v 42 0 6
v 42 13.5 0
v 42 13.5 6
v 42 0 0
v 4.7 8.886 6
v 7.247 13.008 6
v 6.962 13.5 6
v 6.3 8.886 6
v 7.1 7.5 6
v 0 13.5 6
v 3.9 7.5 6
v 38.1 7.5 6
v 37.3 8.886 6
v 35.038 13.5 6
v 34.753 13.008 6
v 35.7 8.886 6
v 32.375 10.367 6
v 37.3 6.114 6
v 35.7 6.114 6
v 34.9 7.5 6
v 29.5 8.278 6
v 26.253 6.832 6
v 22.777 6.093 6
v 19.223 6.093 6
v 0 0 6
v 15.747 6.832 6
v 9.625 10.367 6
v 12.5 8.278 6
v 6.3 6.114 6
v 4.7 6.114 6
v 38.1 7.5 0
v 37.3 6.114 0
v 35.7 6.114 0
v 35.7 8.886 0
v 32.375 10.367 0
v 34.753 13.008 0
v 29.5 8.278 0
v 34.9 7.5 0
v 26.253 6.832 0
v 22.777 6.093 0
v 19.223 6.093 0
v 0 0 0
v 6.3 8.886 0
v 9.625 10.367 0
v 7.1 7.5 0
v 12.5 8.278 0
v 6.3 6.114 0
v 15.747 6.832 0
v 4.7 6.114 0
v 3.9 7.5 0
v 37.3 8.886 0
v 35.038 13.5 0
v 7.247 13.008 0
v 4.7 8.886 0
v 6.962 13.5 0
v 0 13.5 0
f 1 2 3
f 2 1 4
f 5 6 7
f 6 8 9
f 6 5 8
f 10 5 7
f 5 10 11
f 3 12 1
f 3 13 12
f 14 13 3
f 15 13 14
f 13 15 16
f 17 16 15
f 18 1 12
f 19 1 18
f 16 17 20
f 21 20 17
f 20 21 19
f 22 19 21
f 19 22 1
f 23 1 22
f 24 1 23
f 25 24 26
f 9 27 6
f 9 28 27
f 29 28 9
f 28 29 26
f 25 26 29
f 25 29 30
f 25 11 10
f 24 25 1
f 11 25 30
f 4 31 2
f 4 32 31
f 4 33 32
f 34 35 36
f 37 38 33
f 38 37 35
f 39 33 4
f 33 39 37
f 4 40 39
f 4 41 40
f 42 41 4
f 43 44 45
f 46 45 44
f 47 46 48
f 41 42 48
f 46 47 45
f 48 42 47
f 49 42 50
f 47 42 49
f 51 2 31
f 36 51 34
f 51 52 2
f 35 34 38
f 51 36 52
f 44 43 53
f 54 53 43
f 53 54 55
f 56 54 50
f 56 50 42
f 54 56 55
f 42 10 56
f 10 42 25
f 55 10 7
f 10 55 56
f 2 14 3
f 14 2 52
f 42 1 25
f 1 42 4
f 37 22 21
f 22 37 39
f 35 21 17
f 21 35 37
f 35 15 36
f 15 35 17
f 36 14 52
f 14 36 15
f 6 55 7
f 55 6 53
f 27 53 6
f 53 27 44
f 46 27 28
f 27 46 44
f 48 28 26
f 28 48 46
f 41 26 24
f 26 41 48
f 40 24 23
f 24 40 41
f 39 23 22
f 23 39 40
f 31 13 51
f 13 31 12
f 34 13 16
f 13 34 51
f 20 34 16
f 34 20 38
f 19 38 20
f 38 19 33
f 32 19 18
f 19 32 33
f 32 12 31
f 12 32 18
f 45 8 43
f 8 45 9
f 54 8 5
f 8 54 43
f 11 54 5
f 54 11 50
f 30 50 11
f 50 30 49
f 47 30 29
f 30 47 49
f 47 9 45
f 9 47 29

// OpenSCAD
//Motors lib
m3=1.5;
m4=2;

echo ("Loading Motors Lib....");
//Deatils of the Motors [Nema 14, Nema 17, Nema 23]
//half of the distance of the bolts from each other
nema_bolt_offset = [13,15.5,23.57];
//The bolt used to secure the motor
nema_bolt_size = [m3+01,m3+0.1,m4+0.1];
//Circural eleavation around the shaft on the top of the motor
nema_middle = [12,17,19.5];
//width of the motor 
nema_width = [35.5,42,56.4];
//lenght of the motor. This value may need to get adjusted as it depends of many factors like brand and strenght
nema_lenght = [28,45,56];
//shaft of the motor 
nema_shaft = [5,5,6.35];

//Ofseting the motor holes away of the edge of the motors to give a small gap.
motor_edge_gap=-2;
motor_holder_thickness = 6; //TODO move this to Printer.scad


module nema_mount(axe){
	difference(){
		cube([nema_width[axe],nema_bolt_offset[axe]+motor_edge_gap,motor_holder_thickness],center=false);
		translate([nema_width[axe]/2,nema_width[axe]/2-motor_edge_gap,motor_holder_thickness/2]){
			linear_extrude(height = motor_holder_thickness+2, center = true, convexity = 10)	{
				nema_mount_holes(axe);	
			}
		}
	}
}

//Axes can be [X,Y,Z,E] 
module nema_mount_holes(axe){
	union(){ 
		translate([nema_bolt_offset[axe],nema_bolt_offset[axe],0]){
					circle(nema_bolt_size[axe]);
				}
		translate([-nema_bolt_offset[axe],nema_bolt_offset[axe],0]){
					circle(nema_bolt_size[axe]);
				}
		translate([nema_bolt_offset[axe],-nema_bolt_offset[axe],0]){
					circle(nema_bolt_size[axe]);
				}
		translate([-nema_bolt_offset[axe],-nema_bolt_offset[axe],0]){
					circle(nema_bolt_size[axe]);
				}
		circle(nema_middle[axe]);
		
	}
}

nema_mount(1);	
